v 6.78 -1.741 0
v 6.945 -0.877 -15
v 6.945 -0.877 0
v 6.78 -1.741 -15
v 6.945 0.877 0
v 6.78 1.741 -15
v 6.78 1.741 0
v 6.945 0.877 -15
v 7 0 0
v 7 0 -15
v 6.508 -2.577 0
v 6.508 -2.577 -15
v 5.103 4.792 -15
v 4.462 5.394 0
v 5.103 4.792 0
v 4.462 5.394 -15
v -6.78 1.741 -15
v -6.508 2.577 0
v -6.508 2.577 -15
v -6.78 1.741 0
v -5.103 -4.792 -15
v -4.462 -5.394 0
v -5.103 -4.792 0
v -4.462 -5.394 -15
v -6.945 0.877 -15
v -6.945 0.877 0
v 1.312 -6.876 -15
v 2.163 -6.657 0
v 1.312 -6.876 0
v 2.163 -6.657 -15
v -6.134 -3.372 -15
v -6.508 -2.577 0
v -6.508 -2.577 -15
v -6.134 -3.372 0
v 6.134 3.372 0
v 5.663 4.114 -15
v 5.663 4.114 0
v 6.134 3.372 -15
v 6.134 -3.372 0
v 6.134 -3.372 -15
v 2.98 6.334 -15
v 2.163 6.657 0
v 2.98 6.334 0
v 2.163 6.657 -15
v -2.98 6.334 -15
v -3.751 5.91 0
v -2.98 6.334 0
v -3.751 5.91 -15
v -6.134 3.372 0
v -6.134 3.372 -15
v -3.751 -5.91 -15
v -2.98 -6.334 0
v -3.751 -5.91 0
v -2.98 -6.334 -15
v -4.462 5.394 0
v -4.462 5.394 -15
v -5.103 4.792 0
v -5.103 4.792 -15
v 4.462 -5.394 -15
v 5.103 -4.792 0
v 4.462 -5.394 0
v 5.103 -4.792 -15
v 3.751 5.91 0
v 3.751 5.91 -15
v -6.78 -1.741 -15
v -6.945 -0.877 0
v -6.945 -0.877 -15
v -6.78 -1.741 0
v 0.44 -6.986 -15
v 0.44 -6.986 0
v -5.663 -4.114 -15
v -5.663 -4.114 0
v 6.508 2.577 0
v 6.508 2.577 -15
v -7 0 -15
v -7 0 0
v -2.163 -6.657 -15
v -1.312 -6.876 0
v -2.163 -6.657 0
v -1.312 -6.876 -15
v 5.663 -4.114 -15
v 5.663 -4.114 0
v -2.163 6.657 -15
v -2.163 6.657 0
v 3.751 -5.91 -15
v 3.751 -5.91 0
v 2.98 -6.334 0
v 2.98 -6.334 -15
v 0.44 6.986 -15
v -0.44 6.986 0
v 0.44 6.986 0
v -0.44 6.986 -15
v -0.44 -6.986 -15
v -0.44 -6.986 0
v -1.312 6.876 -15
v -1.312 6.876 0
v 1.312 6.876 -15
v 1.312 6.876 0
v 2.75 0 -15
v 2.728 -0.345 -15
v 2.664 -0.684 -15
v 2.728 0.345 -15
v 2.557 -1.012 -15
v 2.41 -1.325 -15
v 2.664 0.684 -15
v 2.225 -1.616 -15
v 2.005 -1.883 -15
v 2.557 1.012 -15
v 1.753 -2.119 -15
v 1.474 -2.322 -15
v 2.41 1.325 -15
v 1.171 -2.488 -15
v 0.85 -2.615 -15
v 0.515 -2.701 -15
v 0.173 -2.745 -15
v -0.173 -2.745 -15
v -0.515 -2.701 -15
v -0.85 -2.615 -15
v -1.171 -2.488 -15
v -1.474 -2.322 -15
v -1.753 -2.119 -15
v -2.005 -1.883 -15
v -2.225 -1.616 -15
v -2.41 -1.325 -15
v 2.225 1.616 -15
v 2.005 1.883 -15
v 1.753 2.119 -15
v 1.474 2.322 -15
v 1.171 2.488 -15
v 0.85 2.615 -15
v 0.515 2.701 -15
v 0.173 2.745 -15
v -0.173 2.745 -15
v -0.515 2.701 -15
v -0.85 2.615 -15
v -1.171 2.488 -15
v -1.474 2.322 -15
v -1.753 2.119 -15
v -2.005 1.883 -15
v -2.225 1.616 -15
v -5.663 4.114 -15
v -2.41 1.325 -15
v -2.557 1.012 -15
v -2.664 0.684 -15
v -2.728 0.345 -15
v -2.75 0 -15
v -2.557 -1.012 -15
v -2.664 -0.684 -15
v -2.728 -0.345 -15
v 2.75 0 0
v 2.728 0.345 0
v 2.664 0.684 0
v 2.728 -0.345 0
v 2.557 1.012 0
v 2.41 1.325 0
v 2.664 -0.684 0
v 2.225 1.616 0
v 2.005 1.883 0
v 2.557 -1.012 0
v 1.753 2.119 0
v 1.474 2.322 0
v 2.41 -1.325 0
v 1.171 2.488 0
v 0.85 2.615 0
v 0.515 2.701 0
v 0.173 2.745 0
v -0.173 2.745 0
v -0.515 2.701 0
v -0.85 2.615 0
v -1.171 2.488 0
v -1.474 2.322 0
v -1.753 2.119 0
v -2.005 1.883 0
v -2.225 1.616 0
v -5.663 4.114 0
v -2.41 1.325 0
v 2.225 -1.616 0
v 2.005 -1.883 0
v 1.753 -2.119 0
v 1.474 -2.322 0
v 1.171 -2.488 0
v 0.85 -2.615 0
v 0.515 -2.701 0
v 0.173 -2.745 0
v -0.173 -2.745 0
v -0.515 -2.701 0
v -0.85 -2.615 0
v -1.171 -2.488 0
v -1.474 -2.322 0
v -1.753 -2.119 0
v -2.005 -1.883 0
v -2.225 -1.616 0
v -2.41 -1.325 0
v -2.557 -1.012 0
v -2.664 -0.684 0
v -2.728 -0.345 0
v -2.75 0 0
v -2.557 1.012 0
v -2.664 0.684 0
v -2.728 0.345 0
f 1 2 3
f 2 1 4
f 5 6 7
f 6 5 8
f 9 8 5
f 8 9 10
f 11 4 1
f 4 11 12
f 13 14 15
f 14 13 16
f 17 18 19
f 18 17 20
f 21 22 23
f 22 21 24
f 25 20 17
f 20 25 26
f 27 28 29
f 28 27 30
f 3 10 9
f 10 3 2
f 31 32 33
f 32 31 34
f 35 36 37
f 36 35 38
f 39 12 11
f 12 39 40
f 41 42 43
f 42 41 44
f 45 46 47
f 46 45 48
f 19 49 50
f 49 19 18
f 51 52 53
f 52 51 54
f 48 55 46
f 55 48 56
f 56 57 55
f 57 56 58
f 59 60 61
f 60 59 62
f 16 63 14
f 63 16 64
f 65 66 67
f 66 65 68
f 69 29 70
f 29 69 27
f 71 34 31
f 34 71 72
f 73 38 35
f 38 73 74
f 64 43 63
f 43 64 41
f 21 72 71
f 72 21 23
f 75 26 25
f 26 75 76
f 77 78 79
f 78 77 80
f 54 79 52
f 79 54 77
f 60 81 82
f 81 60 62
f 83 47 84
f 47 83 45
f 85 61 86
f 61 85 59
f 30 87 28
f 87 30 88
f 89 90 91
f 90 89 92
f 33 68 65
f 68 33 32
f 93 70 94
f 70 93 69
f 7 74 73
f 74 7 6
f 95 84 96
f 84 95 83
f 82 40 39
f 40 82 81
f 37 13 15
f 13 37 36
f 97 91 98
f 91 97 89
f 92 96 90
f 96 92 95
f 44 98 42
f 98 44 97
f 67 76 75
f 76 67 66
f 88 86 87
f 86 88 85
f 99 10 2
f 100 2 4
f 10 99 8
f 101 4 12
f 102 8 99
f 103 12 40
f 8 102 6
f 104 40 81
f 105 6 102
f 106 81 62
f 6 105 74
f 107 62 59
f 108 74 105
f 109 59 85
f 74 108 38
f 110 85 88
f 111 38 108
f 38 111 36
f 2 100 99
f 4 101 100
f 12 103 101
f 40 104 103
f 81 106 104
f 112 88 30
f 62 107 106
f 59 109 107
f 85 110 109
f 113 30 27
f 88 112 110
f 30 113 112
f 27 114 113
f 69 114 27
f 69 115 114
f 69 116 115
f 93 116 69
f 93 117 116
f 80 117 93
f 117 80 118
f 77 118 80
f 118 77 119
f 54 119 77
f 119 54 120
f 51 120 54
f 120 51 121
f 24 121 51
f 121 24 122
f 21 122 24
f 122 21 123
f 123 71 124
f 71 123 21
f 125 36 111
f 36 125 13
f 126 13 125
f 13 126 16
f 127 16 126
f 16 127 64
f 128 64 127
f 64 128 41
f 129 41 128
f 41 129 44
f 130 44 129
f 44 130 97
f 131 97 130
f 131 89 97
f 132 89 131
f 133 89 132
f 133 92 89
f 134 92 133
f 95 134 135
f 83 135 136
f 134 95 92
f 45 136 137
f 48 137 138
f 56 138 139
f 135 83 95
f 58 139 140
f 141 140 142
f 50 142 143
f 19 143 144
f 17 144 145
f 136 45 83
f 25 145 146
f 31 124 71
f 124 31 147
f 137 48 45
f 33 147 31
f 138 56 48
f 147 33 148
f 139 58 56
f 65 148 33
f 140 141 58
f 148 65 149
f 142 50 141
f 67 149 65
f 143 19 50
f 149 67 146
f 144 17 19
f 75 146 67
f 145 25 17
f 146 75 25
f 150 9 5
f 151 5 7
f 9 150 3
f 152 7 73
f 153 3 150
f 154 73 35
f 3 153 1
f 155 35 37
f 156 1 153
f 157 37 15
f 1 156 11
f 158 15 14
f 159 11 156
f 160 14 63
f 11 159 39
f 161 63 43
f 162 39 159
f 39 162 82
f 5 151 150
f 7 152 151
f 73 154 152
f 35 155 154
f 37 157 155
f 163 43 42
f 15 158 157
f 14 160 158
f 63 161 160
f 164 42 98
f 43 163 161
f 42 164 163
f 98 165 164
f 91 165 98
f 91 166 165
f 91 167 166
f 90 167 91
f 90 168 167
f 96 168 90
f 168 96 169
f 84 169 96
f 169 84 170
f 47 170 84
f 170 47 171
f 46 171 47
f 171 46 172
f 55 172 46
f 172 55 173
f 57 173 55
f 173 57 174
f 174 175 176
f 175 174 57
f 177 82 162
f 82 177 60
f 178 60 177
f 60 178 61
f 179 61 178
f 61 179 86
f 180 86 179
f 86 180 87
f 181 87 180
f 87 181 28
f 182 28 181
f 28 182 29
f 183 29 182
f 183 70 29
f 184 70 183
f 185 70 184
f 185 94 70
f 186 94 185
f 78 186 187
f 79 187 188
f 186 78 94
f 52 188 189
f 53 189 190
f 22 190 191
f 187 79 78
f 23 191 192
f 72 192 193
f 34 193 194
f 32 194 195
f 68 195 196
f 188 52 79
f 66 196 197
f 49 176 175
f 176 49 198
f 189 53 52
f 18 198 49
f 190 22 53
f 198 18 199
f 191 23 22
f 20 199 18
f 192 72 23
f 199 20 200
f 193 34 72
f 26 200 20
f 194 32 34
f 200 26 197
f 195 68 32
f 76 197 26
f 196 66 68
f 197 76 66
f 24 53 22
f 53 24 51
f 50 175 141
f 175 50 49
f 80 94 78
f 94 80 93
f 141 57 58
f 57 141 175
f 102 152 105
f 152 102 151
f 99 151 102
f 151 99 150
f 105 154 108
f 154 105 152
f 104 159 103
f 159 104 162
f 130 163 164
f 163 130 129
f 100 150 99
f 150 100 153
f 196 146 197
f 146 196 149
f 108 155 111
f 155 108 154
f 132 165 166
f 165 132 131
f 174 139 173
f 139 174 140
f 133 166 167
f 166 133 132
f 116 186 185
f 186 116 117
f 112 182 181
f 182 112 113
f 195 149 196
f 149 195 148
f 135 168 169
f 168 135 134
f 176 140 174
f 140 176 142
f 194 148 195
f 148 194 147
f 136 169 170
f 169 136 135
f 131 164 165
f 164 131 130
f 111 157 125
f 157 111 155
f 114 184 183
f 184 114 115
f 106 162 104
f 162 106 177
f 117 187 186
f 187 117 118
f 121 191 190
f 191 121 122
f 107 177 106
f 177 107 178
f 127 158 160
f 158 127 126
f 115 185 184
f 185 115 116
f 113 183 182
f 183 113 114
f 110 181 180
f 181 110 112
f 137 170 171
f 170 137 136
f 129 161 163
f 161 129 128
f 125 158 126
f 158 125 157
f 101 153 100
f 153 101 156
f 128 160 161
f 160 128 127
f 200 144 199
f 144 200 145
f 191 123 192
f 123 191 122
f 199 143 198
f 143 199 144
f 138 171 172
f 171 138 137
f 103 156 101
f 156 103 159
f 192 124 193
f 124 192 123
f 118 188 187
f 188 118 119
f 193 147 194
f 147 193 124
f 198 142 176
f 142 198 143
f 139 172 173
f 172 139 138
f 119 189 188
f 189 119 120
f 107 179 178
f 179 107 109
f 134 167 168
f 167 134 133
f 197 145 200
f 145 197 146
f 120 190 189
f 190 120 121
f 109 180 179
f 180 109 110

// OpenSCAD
$fn = 50;


difference() {
	union() {
		translate(v = [0, 0, -15.0000000000]) {
			cylinder(h = 15, r = 7.0000000000);
		}
		cylinder(h = 0, r = 10.0000000000);
	}
	union() {
		#translate(v = [0, 0, -15]) {
			cylinder(h = 15, r = 2.7500000000);
		}
	}
}
